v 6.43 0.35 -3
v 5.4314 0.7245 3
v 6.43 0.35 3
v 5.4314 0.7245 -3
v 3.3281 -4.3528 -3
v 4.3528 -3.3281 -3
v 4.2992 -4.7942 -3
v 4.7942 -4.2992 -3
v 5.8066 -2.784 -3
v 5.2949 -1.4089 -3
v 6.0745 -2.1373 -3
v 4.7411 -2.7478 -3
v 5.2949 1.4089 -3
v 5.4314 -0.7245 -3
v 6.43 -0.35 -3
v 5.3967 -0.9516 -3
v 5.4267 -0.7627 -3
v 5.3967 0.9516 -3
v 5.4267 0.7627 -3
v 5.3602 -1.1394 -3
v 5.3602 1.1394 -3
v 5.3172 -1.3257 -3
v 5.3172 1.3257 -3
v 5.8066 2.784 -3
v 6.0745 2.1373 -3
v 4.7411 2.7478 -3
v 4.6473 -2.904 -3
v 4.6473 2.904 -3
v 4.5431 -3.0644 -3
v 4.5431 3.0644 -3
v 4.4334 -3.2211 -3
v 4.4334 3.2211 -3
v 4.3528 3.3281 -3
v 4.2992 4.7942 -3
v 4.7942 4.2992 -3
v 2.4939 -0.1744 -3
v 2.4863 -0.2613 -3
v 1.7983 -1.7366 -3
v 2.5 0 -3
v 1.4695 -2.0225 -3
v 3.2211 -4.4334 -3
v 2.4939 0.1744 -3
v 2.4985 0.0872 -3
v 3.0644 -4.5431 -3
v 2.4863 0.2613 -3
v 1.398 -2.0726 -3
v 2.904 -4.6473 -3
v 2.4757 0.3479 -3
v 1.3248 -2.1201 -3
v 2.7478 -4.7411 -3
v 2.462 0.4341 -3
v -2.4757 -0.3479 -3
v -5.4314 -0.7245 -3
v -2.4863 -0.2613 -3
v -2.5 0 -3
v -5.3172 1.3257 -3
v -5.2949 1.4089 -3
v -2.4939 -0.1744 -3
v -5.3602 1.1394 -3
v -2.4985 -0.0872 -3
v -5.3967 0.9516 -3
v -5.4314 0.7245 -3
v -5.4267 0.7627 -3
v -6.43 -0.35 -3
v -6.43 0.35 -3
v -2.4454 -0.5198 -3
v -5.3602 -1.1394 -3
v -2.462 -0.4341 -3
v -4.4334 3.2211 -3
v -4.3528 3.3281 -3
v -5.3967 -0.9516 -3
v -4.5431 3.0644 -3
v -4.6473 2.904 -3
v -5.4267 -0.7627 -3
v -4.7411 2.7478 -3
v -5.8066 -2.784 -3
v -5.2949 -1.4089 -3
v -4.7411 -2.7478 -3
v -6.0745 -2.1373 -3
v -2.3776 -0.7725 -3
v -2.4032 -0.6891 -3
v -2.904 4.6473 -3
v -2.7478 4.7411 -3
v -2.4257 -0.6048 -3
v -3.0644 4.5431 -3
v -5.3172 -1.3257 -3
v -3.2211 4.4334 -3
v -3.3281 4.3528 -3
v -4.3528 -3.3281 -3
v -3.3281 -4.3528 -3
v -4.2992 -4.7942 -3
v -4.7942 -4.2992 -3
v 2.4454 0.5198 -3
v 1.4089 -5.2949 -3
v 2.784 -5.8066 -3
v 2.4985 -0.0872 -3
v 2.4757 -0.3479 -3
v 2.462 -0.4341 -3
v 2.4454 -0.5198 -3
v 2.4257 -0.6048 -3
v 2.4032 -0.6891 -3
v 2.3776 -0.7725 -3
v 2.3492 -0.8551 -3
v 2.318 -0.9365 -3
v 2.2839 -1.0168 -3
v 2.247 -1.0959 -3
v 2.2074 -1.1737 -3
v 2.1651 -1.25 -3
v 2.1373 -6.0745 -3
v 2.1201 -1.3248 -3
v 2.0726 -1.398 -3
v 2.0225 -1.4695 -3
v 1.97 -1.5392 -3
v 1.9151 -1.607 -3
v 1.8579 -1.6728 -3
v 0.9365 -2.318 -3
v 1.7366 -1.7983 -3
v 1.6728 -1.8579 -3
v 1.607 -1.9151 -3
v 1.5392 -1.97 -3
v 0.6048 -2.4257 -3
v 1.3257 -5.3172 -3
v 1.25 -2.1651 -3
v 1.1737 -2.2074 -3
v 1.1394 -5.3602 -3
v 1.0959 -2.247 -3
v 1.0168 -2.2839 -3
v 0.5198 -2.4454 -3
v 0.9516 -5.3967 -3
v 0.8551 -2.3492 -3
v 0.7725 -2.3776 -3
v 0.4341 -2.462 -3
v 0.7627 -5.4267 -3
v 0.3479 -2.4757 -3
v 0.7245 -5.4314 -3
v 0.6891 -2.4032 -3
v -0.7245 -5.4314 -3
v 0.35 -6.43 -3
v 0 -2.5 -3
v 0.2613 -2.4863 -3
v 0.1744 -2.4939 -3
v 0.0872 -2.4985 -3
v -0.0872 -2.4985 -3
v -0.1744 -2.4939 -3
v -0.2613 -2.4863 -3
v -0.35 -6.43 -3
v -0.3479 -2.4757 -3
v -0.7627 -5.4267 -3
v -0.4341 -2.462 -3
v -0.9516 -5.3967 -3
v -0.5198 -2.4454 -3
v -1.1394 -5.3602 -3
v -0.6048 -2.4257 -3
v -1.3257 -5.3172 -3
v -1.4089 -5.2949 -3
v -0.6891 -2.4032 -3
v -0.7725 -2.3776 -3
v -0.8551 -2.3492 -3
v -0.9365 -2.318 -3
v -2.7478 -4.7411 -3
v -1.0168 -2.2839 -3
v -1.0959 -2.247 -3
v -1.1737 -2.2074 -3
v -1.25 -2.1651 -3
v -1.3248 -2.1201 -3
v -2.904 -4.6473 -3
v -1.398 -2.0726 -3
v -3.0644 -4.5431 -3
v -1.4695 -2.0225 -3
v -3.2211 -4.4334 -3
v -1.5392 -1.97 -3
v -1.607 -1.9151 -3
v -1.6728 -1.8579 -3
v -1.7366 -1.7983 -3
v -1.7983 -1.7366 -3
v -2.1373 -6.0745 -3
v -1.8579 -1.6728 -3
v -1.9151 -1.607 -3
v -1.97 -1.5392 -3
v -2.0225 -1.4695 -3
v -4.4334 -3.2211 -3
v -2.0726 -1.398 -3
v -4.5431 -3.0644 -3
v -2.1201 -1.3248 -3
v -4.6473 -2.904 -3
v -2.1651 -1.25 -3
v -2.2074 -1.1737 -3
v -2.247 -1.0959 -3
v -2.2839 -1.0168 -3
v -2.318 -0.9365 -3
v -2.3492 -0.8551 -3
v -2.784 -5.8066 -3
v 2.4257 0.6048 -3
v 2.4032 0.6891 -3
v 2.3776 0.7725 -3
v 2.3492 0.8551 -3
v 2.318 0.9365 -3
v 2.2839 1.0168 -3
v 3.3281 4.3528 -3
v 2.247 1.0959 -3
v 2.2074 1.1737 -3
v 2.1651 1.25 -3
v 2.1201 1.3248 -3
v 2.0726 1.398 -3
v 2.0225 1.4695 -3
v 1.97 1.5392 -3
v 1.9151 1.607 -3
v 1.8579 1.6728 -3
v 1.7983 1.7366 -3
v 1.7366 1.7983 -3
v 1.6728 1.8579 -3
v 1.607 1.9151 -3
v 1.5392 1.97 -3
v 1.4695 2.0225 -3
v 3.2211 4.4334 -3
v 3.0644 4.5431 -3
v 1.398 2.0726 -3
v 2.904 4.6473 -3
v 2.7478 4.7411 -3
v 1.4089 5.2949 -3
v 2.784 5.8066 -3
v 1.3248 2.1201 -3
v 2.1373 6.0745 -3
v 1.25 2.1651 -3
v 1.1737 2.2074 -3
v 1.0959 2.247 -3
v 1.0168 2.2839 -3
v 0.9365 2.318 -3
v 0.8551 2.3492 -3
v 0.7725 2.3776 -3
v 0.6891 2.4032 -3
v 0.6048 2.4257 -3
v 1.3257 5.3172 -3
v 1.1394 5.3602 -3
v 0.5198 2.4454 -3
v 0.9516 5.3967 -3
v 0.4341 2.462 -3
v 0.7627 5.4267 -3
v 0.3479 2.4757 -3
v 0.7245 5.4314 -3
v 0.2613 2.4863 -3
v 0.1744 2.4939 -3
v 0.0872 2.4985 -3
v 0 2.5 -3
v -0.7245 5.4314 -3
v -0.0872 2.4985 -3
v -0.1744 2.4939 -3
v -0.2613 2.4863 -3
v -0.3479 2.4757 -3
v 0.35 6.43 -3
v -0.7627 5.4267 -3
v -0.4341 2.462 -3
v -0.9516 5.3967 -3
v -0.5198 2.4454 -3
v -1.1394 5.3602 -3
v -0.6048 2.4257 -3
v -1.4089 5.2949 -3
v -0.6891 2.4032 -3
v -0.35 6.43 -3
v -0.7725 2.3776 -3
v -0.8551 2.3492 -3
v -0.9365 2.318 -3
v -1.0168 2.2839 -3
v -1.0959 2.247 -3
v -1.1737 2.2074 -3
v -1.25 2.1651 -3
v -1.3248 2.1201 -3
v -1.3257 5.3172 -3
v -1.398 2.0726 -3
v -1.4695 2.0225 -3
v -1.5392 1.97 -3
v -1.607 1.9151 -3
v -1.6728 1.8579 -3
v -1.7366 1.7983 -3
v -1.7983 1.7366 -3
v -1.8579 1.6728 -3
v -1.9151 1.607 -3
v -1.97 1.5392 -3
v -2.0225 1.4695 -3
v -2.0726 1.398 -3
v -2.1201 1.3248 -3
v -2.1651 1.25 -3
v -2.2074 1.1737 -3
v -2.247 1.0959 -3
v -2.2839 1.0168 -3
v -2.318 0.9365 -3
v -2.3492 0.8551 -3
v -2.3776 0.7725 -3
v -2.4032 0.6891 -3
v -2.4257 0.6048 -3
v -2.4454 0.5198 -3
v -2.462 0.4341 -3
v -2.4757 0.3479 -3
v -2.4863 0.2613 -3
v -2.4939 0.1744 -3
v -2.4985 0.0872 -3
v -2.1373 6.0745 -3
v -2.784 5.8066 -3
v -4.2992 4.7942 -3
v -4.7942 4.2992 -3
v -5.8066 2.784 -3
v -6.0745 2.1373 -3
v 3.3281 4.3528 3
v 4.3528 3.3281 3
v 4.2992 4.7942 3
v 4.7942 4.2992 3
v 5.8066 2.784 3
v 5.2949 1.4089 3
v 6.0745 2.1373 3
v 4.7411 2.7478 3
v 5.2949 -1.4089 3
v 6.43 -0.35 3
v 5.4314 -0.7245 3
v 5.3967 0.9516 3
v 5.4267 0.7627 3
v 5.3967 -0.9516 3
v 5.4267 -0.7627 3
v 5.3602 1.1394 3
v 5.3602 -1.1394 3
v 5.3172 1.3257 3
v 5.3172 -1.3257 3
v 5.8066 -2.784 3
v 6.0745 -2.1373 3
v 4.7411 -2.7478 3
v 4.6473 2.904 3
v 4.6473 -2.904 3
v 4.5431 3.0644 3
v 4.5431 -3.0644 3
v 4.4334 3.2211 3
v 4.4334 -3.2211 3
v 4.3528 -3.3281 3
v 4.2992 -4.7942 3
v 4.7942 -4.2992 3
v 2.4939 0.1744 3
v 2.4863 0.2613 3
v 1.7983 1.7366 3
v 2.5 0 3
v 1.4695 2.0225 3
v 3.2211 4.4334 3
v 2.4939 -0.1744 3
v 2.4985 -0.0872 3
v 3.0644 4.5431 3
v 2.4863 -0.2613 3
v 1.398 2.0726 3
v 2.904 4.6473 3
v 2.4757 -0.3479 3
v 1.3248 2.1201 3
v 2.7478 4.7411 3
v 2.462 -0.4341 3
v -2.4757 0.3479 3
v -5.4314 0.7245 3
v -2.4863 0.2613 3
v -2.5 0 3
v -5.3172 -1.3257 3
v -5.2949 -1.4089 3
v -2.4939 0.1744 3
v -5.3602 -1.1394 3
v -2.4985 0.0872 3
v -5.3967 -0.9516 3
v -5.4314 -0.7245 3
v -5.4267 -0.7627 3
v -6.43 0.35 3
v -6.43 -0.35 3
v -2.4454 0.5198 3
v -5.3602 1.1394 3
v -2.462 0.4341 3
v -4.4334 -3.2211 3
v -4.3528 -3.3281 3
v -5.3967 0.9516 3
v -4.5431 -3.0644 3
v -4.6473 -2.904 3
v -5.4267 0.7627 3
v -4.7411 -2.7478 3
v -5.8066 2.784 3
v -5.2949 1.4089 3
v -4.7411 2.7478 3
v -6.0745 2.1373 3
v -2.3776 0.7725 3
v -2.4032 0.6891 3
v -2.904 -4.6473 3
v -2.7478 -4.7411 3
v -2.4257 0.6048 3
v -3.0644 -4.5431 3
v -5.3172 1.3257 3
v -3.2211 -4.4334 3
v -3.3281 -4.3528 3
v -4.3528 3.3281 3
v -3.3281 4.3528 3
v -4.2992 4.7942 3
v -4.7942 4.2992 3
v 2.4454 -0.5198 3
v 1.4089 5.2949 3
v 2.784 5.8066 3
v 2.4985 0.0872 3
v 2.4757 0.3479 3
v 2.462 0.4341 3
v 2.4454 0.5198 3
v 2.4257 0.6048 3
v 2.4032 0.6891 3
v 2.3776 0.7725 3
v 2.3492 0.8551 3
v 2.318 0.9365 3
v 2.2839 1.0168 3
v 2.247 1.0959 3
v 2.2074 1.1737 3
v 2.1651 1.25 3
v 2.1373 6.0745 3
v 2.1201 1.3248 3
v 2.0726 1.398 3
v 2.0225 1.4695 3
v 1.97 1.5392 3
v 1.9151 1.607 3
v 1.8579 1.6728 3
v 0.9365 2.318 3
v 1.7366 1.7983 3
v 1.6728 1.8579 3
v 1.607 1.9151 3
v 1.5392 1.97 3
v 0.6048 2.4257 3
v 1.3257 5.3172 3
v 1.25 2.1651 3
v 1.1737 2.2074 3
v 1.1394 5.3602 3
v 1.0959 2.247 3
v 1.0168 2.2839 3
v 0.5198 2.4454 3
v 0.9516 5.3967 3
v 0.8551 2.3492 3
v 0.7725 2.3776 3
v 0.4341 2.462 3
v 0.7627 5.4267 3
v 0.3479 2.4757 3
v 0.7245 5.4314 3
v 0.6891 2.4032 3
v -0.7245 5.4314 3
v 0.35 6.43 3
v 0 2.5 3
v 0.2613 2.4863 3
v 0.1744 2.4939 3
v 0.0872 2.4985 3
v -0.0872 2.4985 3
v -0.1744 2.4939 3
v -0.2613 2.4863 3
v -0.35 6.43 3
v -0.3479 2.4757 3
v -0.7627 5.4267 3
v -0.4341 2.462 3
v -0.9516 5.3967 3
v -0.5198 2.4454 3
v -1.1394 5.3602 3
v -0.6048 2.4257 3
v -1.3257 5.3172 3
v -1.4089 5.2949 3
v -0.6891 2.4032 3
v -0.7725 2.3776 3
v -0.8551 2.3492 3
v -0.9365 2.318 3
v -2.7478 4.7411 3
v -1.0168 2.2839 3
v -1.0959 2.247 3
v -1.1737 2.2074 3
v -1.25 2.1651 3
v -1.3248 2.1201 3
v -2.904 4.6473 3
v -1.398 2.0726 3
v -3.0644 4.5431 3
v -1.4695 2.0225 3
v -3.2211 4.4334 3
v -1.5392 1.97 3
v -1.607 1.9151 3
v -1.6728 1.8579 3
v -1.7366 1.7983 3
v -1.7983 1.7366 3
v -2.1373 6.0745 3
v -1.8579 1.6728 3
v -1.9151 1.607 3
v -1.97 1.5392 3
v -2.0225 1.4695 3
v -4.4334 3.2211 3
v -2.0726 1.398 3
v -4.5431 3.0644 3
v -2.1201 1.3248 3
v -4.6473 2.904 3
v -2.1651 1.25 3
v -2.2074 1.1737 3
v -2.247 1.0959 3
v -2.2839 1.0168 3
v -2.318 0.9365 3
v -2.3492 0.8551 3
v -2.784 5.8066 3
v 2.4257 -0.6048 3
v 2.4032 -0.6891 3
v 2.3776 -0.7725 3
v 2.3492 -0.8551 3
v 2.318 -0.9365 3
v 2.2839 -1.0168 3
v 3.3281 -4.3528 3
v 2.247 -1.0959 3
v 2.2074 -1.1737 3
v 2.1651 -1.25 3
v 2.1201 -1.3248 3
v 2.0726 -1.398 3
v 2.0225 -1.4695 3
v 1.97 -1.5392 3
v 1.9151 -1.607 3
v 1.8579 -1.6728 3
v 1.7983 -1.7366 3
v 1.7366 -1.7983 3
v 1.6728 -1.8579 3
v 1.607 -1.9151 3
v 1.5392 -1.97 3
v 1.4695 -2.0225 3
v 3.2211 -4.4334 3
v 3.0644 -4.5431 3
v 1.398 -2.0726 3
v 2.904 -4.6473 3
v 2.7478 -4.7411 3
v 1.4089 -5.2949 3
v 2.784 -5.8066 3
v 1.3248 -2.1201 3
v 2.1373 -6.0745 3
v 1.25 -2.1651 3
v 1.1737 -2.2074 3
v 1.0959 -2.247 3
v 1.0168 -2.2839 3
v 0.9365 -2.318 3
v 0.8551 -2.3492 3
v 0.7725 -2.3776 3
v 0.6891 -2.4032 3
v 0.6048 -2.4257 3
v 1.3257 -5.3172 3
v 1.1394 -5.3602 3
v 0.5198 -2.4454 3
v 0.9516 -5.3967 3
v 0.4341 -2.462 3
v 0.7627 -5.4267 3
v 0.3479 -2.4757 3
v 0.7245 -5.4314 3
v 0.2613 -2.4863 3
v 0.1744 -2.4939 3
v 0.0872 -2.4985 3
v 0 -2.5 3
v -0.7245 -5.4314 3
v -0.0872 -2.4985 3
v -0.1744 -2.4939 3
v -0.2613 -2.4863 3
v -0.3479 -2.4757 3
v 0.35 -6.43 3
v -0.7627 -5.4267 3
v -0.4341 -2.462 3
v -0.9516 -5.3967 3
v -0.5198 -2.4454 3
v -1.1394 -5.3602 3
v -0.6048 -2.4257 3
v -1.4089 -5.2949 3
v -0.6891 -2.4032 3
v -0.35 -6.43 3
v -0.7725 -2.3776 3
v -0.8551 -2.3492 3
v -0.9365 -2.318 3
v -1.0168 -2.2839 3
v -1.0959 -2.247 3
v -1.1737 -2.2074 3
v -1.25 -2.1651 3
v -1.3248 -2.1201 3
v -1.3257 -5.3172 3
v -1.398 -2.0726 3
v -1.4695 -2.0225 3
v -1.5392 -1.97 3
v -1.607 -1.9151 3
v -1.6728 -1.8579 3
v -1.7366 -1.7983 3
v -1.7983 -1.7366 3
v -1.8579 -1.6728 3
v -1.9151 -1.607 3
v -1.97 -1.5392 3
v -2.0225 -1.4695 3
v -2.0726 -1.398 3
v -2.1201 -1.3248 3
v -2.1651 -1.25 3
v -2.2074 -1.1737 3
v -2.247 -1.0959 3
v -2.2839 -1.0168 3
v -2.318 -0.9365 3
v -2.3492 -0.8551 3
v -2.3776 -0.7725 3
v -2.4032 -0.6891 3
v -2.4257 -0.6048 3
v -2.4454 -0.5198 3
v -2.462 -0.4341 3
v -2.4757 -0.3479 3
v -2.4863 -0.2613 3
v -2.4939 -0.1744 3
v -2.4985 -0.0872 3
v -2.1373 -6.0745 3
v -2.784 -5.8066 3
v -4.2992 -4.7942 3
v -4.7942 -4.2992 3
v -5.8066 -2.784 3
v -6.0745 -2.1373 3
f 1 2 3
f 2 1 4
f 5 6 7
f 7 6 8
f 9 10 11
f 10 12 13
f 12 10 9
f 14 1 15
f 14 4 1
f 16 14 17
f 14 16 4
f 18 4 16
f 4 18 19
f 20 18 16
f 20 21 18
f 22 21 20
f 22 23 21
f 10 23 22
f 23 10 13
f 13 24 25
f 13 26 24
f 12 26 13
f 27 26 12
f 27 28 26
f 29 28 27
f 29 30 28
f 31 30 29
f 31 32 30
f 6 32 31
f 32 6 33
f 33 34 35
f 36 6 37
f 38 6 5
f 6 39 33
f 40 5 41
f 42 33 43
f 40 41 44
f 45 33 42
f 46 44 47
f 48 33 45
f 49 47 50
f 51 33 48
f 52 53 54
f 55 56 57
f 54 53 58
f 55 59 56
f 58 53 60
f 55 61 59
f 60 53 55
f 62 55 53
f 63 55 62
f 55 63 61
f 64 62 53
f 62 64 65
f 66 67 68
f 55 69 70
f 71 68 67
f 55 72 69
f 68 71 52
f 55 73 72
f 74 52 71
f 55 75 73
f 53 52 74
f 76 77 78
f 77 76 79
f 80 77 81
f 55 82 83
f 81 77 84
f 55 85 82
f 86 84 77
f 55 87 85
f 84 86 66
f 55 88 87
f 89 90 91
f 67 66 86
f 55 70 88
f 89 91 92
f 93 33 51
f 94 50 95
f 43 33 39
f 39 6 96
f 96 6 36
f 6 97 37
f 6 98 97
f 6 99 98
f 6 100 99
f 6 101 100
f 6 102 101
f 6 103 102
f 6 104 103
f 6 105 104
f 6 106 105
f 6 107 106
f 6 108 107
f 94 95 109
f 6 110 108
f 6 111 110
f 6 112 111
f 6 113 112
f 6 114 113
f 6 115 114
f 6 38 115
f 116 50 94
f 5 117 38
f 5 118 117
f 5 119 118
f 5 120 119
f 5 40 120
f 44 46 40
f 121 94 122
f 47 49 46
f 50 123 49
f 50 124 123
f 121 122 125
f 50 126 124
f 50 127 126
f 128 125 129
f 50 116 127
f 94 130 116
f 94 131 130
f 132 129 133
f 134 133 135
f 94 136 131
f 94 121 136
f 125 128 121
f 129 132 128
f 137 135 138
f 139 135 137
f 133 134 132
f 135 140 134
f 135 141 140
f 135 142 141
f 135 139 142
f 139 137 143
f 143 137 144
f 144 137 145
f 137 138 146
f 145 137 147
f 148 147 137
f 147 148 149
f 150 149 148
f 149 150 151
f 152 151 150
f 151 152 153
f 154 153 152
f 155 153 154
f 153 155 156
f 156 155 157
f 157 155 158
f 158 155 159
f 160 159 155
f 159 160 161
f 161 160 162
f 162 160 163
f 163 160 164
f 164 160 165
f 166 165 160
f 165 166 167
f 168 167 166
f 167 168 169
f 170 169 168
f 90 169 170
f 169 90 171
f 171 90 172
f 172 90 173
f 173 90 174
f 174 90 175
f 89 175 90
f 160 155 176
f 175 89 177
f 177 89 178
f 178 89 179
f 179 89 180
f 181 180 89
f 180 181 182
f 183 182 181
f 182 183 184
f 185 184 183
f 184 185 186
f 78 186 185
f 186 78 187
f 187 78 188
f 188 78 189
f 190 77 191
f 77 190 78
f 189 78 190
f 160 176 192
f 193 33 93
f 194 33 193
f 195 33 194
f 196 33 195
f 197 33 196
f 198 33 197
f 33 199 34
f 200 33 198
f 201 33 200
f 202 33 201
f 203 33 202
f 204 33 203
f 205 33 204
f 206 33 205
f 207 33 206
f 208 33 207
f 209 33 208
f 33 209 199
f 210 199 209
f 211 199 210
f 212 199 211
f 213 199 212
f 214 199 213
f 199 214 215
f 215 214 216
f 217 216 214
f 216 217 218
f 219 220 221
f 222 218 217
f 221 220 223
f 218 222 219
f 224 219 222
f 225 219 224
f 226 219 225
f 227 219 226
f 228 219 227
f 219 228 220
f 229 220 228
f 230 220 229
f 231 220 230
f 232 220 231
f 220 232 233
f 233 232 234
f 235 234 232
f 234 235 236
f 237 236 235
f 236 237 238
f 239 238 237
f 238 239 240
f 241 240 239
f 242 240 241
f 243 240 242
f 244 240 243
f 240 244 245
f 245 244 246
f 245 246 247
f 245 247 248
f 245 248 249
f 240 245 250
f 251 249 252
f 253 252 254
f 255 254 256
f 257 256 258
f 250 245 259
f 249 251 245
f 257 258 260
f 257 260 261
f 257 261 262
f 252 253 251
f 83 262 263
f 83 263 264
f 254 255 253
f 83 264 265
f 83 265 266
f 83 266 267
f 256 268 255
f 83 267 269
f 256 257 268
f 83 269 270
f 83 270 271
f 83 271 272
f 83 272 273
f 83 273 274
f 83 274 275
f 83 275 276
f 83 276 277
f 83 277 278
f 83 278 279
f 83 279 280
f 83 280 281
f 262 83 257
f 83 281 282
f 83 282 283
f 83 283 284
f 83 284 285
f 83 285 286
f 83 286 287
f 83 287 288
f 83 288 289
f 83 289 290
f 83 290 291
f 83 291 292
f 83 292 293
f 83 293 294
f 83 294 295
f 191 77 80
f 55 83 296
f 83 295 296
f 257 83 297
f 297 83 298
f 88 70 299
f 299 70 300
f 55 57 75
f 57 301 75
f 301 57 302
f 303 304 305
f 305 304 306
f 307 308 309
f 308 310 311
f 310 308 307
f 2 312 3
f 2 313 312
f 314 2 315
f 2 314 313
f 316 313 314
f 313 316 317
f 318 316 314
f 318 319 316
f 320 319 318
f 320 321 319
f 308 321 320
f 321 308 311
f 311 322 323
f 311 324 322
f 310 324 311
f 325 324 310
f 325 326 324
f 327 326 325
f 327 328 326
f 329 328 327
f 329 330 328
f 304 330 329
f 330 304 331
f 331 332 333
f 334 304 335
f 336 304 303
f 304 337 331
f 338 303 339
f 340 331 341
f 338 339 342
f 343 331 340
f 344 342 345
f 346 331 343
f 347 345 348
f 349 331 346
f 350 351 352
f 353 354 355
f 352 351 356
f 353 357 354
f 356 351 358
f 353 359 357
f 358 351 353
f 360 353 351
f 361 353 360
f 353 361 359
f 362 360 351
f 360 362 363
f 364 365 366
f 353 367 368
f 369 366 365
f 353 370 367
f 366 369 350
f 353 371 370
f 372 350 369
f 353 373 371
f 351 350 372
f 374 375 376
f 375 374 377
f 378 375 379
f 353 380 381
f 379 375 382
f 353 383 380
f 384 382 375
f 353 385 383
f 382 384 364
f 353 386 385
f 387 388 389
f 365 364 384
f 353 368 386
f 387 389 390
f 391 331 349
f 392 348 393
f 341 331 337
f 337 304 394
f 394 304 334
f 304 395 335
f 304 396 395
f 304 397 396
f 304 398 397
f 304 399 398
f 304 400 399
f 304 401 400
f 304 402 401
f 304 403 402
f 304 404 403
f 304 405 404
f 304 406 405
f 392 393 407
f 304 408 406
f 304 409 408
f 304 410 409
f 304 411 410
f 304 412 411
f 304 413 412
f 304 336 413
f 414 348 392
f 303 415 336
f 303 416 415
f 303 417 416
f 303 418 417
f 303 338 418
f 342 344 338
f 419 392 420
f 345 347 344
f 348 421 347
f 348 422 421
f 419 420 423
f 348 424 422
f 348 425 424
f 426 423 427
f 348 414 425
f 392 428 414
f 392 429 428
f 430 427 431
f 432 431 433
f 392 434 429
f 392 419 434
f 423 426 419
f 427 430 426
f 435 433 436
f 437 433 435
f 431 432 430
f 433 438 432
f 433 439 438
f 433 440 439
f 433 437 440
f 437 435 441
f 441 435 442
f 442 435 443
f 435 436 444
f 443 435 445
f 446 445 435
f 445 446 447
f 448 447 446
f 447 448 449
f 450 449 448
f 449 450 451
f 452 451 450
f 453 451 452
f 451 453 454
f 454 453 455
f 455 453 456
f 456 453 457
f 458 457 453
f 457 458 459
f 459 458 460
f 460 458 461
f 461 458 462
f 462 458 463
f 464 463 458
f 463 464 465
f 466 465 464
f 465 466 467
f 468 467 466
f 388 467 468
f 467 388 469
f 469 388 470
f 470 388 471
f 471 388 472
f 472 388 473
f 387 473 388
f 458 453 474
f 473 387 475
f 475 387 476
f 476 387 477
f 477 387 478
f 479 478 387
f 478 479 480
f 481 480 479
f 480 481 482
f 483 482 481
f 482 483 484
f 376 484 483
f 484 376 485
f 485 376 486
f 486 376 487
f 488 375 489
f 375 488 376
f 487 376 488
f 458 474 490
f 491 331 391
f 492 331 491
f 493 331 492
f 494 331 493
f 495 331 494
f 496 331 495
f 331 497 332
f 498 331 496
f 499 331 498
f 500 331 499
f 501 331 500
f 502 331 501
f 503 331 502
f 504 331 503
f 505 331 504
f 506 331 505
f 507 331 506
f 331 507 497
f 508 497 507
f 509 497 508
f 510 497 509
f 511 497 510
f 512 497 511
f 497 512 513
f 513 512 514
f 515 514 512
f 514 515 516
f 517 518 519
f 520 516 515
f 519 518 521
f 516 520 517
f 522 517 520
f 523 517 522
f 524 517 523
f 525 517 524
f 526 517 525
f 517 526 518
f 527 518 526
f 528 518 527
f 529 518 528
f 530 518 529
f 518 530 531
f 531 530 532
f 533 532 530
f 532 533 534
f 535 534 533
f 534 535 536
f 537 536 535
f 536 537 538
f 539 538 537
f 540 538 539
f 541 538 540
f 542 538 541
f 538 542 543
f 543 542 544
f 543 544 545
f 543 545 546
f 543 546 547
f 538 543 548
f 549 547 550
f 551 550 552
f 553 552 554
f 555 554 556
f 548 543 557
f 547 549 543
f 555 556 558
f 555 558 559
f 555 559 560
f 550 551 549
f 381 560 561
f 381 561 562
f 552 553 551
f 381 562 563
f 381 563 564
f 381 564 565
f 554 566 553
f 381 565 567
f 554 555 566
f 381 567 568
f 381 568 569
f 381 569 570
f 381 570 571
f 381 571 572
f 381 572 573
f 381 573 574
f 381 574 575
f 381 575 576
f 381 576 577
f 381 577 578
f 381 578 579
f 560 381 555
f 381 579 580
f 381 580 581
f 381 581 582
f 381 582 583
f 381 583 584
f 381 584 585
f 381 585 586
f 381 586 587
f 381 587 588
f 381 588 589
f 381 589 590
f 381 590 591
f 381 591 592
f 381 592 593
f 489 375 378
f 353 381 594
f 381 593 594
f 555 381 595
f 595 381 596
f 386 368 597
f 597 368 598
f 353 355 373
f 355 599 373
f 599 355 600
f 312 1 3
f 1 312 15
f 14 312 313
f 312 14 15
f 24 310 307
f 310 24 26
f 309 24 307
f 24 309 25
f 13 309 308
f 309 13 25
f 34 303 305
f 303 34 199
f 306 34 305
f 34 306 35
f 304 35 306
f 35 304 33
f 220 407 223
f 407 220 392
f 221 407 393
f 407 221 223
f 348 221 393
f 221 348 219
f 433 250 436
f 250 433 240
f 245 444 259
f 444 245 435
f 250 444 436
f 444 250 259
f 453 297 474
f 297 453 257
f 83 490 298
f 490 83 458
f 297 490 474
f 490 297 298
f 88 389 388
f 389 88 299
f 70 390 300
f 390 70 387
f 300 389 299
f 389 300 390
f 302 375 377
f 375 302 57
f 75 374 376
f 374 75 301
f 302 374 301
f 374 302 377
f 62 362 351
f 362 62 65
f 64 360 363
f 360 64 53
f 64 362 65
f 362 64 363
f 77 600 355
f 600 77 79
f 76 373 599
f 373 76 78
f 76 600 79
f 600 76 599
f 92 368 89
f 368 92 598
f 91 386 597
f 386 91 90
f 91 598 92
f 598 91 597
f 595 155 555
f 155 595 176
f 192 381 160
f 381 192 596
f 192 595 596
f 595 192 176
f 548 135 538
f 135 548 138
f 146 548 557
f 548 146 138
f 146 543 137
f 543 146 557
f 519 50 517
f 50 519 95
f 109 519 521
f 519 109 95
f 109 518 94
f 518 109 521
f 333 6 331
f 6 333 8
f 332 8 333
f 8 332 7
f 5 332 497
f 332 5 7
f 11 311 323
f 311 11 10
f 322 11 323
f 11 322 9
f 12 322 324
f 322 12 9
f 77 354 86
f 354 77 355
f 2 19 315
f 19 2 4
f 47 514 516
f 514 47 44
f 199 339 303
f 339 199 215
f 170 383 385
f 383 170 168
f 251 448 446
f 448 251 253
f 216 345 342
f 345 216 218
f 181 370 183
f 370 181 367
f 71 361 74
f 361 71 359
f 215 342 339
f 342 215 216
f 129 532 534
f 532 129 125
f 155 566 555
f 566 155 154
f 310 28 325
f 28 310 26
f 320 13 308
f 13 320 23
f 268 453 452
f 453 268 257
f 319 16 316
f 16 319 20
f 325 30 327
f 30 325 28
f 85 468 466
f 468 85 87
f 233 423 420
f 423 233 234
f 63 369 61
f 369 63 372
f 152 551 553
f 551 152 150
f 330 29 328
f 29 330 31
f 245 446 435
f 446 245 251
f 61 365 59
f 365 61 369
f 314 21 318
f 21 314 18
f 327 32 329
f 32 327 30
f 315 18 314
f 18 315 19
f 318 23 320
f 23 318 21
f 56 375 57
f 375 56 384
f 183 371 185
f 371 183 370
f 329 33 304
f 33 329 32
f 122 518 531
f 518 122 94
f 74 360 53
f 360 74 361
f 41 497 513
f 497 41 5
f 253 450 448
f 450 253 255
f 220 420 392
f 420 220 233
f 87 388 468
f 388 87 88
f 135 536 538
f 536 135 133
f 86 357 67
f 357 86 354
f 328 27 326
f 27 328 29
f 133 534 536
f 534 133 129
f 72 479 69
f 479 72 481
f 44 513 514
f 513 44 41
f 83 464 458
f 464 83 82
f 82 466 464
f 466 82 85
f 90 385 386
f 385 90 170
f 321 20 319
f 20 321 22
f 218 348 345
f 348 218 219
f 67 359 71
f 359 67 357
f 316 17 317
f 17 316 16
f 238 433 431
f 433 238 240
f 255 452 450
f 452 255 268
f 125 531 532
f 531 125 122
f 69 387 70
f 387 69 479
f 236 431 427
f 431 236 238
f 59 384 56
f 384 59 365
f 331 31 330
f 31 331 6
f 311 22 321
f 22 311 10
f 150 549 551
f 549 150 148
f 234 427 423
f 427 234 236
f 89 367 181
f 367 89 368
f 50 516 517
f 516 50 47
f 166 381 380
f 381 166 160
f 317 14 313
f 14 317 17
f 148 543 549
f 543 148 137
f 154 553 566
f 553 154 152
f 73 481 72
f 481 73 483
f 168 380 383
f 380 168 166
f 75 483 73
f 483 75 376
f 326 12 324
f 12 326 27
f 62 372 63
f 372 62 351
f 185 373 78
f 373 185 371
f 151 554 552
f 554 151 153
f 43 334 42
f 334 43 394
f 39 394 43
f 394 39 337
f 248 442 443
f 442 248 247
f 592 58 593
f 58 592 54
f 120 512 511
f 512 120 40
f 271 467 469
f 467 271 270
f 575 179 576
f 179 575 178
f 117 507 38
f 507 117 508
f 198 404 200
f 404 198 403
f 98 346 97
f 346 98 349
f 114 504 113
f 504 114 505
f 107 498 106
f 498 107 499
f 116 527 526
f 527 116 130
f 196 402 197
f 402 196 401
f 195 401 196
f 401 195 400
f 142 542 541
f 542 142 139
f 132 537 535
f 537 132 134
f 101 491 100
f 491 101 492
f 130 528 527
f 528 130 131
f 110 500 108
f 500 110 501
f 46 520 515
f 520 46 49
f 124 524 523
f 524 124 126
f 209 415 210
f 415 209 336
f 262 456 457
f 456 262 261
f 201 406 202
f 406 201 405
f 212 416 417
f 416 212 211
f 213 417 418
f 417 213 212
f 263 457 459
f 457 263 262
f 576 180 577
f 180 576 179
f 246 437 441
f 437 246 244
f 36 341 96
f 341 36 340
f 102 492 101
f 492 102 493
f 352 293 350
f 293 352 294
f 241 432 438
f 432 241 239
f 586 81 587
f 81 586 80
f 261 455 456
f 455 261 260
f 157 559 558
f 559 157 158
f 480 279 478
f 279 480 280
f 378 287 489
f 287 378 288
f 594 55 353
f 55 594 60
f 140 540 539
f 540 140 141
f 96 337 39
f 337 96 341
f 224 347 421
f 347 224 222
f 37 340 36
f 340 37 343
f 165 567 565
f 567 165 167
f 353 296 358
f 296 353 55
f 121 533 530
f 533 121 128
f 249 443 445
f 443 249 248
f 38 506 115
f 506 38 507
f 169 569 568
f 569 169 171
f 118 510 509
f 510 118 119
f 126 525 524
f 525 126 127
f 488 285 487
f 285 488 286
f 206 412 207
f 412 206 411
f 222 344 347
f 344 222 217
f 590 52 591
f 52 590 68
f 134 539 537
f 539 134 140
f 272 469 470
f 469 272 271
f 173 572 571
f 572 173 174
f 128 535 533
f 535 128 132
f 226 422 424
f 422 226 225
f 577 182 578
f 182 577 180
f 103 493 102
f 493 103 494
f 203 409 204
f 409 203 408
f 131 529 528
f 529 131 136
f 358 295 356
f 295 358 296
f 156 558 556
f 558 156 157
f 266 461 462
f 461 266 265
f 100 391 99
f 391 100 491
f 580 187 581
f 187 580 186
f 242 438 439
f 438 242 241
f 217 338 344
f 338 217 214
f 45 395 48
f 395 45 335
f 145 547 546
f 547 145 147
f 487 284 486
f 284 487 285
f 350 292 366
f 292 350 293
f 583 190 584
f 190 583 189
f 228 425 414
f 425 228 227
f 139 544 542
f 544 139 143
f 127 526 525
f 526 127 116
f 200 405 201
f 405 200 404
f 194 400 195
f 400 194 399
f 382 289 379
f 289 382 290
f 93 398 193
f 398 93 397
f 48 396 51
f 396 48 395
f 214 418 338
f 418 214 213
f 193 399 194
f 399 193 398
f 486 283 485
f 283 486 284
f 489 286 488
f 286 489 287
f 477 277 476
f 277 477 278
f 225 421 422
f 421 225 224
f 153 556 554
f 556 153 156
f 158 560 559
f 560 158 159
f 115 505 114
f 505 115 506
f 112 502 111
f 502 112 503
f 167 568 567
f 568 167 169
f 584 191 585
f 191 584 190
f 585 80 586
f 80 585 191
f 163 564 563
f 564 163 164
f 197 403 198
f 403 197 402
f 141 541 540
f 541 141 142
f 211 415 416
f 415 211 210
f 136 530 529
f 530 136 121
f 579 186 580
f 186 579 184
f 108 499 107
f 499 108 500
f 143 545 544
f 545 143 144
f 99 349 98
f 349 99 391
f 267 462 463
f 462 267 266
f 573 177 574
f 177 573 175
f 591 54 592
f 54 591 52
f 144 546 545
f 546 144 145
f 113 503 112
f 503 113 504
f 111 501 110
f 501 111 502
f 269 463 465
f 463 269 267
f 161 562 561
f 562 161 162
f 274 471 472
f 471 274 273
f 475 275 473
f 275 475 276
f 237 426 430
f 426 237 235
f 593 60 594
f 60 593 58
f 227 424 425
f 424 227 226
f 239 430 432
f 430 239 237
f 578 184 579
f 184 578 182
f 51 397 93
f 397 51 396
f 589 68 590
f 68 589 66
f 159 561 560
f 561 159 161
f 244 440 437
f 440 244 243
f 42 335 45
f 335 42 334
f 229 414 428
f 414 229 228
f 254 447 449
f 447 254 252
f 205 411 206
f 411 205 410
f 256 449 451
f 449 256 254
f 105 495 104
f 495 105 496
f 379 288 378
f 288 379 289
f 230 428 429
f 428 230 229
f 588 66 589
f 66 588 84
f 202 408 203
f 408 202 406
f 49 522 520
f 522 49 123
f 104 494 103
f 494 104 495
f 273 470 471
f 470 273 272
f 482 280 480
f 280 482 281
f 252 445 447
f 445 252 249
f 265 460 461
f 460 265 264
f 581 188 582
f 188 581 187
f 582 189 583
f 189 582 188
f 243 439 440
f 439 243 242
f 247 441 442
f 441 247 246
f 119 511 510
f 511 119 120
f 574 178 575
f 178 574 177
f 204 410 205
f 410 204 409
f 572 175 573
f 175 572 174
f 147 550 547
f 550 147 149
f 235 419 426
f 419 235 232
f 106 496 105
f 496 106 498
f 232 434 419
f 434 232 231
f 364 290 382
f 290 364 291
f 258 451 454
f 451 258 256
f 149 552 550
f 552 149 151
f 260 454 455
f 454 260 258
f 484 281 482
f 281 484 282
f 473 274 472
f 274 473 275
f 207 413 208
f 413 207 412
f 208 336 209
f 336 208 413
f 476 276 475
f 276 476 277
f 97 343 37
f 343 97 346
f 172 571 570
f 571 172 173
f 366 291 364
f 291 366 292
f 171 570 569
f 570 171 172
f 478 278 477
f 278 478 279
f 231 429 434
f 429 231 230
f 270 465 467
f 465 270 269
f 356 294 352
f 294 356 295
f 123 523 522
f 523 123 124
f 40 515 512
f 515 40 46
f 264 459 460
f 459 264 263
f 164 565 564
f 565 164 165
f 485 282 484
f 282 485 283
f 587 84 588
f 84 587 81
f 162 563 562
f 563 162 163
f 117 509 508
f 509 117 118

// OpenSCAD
// Timing pulley: 16 teeth, 12.16mm pitch diameter
// Single connected solid with visible discrete timing-pulley-like teeth (trapezoidal)

$fn = 180;

// ---------------- Parameters ----------------
teeth = 16;
pitch_diameter = 12.16;
pitch_r = pitch_diameter/2;

// Pulley width (Z)
belt_width = 6;

// Tooth geometry (approx timing pulley profile; trapezoid in plan view)
tooth_height = 1.2;          // radial height from root to tip
tooth_tip_w = 0.7;           // tangential width at tooth tip
tooth_root_w = 1.6;          // tangential width at tooth root (wider than tip)

// Root radius chosen so pitch circle lies between root and tip
root_clearance = 0.6;        // pitch circle above root by this amount
root_r = pitch_r - root_clearance;
tip_r  = root_r + tooth_height;

// Hub/body (keep simple; no flanges, no set screw hole)
hub_diameter = 10;
hub_length   = belt_width;   // match belt width for a simple pulley body

bore_diameter = 5;

// Connectivity overlap
overlap = 0.25;

// ---------------- Helpers ----------------
module tooth_prism(h) {
    // Trapezoid tooth extruded along Z (h)
    // Local coordinates: X = radial, Y = tangential
    // Root face at x=0, tip face at x=tooth_height
    linear_extrude(height=h, center=true, convexity=10)
        polygon(points=[
            [0,            -tooth_root_w/2],
            [0,             tooth_root_w/2],
            [tooth_height,  tooth_tip_w/2],
            [tooth_height, -tooth_tip_w/2]
        ]);
}

module toothed_body() {
    union() {
        // Base cylinder up to root radius
        cylinder(h=belt_width, r=root_r, center=true);

        // Teeth: protrude outward, overlap into root cylinder for connectivity
        for (i = [0:teeth-1]) {
            rotate([0,0,i*360/teeth])
                translate([root_r - overlap, 0, 0])  // root face slightly inside cylinder
                    tooth_prism(belt_width);
        }
    }
}

module pulley() {
    difference() {
        union() {
            // Ensure one connected solid: hub overlaps toothed body
            cylinder(h=hub_length, d=hub_diameter, center=true);
            toothed_body();
        }

        // Bore through entire part
        cylinder(h=hub_length + 2, d=bore_diameter, center=true);
    }
}

pulley();
